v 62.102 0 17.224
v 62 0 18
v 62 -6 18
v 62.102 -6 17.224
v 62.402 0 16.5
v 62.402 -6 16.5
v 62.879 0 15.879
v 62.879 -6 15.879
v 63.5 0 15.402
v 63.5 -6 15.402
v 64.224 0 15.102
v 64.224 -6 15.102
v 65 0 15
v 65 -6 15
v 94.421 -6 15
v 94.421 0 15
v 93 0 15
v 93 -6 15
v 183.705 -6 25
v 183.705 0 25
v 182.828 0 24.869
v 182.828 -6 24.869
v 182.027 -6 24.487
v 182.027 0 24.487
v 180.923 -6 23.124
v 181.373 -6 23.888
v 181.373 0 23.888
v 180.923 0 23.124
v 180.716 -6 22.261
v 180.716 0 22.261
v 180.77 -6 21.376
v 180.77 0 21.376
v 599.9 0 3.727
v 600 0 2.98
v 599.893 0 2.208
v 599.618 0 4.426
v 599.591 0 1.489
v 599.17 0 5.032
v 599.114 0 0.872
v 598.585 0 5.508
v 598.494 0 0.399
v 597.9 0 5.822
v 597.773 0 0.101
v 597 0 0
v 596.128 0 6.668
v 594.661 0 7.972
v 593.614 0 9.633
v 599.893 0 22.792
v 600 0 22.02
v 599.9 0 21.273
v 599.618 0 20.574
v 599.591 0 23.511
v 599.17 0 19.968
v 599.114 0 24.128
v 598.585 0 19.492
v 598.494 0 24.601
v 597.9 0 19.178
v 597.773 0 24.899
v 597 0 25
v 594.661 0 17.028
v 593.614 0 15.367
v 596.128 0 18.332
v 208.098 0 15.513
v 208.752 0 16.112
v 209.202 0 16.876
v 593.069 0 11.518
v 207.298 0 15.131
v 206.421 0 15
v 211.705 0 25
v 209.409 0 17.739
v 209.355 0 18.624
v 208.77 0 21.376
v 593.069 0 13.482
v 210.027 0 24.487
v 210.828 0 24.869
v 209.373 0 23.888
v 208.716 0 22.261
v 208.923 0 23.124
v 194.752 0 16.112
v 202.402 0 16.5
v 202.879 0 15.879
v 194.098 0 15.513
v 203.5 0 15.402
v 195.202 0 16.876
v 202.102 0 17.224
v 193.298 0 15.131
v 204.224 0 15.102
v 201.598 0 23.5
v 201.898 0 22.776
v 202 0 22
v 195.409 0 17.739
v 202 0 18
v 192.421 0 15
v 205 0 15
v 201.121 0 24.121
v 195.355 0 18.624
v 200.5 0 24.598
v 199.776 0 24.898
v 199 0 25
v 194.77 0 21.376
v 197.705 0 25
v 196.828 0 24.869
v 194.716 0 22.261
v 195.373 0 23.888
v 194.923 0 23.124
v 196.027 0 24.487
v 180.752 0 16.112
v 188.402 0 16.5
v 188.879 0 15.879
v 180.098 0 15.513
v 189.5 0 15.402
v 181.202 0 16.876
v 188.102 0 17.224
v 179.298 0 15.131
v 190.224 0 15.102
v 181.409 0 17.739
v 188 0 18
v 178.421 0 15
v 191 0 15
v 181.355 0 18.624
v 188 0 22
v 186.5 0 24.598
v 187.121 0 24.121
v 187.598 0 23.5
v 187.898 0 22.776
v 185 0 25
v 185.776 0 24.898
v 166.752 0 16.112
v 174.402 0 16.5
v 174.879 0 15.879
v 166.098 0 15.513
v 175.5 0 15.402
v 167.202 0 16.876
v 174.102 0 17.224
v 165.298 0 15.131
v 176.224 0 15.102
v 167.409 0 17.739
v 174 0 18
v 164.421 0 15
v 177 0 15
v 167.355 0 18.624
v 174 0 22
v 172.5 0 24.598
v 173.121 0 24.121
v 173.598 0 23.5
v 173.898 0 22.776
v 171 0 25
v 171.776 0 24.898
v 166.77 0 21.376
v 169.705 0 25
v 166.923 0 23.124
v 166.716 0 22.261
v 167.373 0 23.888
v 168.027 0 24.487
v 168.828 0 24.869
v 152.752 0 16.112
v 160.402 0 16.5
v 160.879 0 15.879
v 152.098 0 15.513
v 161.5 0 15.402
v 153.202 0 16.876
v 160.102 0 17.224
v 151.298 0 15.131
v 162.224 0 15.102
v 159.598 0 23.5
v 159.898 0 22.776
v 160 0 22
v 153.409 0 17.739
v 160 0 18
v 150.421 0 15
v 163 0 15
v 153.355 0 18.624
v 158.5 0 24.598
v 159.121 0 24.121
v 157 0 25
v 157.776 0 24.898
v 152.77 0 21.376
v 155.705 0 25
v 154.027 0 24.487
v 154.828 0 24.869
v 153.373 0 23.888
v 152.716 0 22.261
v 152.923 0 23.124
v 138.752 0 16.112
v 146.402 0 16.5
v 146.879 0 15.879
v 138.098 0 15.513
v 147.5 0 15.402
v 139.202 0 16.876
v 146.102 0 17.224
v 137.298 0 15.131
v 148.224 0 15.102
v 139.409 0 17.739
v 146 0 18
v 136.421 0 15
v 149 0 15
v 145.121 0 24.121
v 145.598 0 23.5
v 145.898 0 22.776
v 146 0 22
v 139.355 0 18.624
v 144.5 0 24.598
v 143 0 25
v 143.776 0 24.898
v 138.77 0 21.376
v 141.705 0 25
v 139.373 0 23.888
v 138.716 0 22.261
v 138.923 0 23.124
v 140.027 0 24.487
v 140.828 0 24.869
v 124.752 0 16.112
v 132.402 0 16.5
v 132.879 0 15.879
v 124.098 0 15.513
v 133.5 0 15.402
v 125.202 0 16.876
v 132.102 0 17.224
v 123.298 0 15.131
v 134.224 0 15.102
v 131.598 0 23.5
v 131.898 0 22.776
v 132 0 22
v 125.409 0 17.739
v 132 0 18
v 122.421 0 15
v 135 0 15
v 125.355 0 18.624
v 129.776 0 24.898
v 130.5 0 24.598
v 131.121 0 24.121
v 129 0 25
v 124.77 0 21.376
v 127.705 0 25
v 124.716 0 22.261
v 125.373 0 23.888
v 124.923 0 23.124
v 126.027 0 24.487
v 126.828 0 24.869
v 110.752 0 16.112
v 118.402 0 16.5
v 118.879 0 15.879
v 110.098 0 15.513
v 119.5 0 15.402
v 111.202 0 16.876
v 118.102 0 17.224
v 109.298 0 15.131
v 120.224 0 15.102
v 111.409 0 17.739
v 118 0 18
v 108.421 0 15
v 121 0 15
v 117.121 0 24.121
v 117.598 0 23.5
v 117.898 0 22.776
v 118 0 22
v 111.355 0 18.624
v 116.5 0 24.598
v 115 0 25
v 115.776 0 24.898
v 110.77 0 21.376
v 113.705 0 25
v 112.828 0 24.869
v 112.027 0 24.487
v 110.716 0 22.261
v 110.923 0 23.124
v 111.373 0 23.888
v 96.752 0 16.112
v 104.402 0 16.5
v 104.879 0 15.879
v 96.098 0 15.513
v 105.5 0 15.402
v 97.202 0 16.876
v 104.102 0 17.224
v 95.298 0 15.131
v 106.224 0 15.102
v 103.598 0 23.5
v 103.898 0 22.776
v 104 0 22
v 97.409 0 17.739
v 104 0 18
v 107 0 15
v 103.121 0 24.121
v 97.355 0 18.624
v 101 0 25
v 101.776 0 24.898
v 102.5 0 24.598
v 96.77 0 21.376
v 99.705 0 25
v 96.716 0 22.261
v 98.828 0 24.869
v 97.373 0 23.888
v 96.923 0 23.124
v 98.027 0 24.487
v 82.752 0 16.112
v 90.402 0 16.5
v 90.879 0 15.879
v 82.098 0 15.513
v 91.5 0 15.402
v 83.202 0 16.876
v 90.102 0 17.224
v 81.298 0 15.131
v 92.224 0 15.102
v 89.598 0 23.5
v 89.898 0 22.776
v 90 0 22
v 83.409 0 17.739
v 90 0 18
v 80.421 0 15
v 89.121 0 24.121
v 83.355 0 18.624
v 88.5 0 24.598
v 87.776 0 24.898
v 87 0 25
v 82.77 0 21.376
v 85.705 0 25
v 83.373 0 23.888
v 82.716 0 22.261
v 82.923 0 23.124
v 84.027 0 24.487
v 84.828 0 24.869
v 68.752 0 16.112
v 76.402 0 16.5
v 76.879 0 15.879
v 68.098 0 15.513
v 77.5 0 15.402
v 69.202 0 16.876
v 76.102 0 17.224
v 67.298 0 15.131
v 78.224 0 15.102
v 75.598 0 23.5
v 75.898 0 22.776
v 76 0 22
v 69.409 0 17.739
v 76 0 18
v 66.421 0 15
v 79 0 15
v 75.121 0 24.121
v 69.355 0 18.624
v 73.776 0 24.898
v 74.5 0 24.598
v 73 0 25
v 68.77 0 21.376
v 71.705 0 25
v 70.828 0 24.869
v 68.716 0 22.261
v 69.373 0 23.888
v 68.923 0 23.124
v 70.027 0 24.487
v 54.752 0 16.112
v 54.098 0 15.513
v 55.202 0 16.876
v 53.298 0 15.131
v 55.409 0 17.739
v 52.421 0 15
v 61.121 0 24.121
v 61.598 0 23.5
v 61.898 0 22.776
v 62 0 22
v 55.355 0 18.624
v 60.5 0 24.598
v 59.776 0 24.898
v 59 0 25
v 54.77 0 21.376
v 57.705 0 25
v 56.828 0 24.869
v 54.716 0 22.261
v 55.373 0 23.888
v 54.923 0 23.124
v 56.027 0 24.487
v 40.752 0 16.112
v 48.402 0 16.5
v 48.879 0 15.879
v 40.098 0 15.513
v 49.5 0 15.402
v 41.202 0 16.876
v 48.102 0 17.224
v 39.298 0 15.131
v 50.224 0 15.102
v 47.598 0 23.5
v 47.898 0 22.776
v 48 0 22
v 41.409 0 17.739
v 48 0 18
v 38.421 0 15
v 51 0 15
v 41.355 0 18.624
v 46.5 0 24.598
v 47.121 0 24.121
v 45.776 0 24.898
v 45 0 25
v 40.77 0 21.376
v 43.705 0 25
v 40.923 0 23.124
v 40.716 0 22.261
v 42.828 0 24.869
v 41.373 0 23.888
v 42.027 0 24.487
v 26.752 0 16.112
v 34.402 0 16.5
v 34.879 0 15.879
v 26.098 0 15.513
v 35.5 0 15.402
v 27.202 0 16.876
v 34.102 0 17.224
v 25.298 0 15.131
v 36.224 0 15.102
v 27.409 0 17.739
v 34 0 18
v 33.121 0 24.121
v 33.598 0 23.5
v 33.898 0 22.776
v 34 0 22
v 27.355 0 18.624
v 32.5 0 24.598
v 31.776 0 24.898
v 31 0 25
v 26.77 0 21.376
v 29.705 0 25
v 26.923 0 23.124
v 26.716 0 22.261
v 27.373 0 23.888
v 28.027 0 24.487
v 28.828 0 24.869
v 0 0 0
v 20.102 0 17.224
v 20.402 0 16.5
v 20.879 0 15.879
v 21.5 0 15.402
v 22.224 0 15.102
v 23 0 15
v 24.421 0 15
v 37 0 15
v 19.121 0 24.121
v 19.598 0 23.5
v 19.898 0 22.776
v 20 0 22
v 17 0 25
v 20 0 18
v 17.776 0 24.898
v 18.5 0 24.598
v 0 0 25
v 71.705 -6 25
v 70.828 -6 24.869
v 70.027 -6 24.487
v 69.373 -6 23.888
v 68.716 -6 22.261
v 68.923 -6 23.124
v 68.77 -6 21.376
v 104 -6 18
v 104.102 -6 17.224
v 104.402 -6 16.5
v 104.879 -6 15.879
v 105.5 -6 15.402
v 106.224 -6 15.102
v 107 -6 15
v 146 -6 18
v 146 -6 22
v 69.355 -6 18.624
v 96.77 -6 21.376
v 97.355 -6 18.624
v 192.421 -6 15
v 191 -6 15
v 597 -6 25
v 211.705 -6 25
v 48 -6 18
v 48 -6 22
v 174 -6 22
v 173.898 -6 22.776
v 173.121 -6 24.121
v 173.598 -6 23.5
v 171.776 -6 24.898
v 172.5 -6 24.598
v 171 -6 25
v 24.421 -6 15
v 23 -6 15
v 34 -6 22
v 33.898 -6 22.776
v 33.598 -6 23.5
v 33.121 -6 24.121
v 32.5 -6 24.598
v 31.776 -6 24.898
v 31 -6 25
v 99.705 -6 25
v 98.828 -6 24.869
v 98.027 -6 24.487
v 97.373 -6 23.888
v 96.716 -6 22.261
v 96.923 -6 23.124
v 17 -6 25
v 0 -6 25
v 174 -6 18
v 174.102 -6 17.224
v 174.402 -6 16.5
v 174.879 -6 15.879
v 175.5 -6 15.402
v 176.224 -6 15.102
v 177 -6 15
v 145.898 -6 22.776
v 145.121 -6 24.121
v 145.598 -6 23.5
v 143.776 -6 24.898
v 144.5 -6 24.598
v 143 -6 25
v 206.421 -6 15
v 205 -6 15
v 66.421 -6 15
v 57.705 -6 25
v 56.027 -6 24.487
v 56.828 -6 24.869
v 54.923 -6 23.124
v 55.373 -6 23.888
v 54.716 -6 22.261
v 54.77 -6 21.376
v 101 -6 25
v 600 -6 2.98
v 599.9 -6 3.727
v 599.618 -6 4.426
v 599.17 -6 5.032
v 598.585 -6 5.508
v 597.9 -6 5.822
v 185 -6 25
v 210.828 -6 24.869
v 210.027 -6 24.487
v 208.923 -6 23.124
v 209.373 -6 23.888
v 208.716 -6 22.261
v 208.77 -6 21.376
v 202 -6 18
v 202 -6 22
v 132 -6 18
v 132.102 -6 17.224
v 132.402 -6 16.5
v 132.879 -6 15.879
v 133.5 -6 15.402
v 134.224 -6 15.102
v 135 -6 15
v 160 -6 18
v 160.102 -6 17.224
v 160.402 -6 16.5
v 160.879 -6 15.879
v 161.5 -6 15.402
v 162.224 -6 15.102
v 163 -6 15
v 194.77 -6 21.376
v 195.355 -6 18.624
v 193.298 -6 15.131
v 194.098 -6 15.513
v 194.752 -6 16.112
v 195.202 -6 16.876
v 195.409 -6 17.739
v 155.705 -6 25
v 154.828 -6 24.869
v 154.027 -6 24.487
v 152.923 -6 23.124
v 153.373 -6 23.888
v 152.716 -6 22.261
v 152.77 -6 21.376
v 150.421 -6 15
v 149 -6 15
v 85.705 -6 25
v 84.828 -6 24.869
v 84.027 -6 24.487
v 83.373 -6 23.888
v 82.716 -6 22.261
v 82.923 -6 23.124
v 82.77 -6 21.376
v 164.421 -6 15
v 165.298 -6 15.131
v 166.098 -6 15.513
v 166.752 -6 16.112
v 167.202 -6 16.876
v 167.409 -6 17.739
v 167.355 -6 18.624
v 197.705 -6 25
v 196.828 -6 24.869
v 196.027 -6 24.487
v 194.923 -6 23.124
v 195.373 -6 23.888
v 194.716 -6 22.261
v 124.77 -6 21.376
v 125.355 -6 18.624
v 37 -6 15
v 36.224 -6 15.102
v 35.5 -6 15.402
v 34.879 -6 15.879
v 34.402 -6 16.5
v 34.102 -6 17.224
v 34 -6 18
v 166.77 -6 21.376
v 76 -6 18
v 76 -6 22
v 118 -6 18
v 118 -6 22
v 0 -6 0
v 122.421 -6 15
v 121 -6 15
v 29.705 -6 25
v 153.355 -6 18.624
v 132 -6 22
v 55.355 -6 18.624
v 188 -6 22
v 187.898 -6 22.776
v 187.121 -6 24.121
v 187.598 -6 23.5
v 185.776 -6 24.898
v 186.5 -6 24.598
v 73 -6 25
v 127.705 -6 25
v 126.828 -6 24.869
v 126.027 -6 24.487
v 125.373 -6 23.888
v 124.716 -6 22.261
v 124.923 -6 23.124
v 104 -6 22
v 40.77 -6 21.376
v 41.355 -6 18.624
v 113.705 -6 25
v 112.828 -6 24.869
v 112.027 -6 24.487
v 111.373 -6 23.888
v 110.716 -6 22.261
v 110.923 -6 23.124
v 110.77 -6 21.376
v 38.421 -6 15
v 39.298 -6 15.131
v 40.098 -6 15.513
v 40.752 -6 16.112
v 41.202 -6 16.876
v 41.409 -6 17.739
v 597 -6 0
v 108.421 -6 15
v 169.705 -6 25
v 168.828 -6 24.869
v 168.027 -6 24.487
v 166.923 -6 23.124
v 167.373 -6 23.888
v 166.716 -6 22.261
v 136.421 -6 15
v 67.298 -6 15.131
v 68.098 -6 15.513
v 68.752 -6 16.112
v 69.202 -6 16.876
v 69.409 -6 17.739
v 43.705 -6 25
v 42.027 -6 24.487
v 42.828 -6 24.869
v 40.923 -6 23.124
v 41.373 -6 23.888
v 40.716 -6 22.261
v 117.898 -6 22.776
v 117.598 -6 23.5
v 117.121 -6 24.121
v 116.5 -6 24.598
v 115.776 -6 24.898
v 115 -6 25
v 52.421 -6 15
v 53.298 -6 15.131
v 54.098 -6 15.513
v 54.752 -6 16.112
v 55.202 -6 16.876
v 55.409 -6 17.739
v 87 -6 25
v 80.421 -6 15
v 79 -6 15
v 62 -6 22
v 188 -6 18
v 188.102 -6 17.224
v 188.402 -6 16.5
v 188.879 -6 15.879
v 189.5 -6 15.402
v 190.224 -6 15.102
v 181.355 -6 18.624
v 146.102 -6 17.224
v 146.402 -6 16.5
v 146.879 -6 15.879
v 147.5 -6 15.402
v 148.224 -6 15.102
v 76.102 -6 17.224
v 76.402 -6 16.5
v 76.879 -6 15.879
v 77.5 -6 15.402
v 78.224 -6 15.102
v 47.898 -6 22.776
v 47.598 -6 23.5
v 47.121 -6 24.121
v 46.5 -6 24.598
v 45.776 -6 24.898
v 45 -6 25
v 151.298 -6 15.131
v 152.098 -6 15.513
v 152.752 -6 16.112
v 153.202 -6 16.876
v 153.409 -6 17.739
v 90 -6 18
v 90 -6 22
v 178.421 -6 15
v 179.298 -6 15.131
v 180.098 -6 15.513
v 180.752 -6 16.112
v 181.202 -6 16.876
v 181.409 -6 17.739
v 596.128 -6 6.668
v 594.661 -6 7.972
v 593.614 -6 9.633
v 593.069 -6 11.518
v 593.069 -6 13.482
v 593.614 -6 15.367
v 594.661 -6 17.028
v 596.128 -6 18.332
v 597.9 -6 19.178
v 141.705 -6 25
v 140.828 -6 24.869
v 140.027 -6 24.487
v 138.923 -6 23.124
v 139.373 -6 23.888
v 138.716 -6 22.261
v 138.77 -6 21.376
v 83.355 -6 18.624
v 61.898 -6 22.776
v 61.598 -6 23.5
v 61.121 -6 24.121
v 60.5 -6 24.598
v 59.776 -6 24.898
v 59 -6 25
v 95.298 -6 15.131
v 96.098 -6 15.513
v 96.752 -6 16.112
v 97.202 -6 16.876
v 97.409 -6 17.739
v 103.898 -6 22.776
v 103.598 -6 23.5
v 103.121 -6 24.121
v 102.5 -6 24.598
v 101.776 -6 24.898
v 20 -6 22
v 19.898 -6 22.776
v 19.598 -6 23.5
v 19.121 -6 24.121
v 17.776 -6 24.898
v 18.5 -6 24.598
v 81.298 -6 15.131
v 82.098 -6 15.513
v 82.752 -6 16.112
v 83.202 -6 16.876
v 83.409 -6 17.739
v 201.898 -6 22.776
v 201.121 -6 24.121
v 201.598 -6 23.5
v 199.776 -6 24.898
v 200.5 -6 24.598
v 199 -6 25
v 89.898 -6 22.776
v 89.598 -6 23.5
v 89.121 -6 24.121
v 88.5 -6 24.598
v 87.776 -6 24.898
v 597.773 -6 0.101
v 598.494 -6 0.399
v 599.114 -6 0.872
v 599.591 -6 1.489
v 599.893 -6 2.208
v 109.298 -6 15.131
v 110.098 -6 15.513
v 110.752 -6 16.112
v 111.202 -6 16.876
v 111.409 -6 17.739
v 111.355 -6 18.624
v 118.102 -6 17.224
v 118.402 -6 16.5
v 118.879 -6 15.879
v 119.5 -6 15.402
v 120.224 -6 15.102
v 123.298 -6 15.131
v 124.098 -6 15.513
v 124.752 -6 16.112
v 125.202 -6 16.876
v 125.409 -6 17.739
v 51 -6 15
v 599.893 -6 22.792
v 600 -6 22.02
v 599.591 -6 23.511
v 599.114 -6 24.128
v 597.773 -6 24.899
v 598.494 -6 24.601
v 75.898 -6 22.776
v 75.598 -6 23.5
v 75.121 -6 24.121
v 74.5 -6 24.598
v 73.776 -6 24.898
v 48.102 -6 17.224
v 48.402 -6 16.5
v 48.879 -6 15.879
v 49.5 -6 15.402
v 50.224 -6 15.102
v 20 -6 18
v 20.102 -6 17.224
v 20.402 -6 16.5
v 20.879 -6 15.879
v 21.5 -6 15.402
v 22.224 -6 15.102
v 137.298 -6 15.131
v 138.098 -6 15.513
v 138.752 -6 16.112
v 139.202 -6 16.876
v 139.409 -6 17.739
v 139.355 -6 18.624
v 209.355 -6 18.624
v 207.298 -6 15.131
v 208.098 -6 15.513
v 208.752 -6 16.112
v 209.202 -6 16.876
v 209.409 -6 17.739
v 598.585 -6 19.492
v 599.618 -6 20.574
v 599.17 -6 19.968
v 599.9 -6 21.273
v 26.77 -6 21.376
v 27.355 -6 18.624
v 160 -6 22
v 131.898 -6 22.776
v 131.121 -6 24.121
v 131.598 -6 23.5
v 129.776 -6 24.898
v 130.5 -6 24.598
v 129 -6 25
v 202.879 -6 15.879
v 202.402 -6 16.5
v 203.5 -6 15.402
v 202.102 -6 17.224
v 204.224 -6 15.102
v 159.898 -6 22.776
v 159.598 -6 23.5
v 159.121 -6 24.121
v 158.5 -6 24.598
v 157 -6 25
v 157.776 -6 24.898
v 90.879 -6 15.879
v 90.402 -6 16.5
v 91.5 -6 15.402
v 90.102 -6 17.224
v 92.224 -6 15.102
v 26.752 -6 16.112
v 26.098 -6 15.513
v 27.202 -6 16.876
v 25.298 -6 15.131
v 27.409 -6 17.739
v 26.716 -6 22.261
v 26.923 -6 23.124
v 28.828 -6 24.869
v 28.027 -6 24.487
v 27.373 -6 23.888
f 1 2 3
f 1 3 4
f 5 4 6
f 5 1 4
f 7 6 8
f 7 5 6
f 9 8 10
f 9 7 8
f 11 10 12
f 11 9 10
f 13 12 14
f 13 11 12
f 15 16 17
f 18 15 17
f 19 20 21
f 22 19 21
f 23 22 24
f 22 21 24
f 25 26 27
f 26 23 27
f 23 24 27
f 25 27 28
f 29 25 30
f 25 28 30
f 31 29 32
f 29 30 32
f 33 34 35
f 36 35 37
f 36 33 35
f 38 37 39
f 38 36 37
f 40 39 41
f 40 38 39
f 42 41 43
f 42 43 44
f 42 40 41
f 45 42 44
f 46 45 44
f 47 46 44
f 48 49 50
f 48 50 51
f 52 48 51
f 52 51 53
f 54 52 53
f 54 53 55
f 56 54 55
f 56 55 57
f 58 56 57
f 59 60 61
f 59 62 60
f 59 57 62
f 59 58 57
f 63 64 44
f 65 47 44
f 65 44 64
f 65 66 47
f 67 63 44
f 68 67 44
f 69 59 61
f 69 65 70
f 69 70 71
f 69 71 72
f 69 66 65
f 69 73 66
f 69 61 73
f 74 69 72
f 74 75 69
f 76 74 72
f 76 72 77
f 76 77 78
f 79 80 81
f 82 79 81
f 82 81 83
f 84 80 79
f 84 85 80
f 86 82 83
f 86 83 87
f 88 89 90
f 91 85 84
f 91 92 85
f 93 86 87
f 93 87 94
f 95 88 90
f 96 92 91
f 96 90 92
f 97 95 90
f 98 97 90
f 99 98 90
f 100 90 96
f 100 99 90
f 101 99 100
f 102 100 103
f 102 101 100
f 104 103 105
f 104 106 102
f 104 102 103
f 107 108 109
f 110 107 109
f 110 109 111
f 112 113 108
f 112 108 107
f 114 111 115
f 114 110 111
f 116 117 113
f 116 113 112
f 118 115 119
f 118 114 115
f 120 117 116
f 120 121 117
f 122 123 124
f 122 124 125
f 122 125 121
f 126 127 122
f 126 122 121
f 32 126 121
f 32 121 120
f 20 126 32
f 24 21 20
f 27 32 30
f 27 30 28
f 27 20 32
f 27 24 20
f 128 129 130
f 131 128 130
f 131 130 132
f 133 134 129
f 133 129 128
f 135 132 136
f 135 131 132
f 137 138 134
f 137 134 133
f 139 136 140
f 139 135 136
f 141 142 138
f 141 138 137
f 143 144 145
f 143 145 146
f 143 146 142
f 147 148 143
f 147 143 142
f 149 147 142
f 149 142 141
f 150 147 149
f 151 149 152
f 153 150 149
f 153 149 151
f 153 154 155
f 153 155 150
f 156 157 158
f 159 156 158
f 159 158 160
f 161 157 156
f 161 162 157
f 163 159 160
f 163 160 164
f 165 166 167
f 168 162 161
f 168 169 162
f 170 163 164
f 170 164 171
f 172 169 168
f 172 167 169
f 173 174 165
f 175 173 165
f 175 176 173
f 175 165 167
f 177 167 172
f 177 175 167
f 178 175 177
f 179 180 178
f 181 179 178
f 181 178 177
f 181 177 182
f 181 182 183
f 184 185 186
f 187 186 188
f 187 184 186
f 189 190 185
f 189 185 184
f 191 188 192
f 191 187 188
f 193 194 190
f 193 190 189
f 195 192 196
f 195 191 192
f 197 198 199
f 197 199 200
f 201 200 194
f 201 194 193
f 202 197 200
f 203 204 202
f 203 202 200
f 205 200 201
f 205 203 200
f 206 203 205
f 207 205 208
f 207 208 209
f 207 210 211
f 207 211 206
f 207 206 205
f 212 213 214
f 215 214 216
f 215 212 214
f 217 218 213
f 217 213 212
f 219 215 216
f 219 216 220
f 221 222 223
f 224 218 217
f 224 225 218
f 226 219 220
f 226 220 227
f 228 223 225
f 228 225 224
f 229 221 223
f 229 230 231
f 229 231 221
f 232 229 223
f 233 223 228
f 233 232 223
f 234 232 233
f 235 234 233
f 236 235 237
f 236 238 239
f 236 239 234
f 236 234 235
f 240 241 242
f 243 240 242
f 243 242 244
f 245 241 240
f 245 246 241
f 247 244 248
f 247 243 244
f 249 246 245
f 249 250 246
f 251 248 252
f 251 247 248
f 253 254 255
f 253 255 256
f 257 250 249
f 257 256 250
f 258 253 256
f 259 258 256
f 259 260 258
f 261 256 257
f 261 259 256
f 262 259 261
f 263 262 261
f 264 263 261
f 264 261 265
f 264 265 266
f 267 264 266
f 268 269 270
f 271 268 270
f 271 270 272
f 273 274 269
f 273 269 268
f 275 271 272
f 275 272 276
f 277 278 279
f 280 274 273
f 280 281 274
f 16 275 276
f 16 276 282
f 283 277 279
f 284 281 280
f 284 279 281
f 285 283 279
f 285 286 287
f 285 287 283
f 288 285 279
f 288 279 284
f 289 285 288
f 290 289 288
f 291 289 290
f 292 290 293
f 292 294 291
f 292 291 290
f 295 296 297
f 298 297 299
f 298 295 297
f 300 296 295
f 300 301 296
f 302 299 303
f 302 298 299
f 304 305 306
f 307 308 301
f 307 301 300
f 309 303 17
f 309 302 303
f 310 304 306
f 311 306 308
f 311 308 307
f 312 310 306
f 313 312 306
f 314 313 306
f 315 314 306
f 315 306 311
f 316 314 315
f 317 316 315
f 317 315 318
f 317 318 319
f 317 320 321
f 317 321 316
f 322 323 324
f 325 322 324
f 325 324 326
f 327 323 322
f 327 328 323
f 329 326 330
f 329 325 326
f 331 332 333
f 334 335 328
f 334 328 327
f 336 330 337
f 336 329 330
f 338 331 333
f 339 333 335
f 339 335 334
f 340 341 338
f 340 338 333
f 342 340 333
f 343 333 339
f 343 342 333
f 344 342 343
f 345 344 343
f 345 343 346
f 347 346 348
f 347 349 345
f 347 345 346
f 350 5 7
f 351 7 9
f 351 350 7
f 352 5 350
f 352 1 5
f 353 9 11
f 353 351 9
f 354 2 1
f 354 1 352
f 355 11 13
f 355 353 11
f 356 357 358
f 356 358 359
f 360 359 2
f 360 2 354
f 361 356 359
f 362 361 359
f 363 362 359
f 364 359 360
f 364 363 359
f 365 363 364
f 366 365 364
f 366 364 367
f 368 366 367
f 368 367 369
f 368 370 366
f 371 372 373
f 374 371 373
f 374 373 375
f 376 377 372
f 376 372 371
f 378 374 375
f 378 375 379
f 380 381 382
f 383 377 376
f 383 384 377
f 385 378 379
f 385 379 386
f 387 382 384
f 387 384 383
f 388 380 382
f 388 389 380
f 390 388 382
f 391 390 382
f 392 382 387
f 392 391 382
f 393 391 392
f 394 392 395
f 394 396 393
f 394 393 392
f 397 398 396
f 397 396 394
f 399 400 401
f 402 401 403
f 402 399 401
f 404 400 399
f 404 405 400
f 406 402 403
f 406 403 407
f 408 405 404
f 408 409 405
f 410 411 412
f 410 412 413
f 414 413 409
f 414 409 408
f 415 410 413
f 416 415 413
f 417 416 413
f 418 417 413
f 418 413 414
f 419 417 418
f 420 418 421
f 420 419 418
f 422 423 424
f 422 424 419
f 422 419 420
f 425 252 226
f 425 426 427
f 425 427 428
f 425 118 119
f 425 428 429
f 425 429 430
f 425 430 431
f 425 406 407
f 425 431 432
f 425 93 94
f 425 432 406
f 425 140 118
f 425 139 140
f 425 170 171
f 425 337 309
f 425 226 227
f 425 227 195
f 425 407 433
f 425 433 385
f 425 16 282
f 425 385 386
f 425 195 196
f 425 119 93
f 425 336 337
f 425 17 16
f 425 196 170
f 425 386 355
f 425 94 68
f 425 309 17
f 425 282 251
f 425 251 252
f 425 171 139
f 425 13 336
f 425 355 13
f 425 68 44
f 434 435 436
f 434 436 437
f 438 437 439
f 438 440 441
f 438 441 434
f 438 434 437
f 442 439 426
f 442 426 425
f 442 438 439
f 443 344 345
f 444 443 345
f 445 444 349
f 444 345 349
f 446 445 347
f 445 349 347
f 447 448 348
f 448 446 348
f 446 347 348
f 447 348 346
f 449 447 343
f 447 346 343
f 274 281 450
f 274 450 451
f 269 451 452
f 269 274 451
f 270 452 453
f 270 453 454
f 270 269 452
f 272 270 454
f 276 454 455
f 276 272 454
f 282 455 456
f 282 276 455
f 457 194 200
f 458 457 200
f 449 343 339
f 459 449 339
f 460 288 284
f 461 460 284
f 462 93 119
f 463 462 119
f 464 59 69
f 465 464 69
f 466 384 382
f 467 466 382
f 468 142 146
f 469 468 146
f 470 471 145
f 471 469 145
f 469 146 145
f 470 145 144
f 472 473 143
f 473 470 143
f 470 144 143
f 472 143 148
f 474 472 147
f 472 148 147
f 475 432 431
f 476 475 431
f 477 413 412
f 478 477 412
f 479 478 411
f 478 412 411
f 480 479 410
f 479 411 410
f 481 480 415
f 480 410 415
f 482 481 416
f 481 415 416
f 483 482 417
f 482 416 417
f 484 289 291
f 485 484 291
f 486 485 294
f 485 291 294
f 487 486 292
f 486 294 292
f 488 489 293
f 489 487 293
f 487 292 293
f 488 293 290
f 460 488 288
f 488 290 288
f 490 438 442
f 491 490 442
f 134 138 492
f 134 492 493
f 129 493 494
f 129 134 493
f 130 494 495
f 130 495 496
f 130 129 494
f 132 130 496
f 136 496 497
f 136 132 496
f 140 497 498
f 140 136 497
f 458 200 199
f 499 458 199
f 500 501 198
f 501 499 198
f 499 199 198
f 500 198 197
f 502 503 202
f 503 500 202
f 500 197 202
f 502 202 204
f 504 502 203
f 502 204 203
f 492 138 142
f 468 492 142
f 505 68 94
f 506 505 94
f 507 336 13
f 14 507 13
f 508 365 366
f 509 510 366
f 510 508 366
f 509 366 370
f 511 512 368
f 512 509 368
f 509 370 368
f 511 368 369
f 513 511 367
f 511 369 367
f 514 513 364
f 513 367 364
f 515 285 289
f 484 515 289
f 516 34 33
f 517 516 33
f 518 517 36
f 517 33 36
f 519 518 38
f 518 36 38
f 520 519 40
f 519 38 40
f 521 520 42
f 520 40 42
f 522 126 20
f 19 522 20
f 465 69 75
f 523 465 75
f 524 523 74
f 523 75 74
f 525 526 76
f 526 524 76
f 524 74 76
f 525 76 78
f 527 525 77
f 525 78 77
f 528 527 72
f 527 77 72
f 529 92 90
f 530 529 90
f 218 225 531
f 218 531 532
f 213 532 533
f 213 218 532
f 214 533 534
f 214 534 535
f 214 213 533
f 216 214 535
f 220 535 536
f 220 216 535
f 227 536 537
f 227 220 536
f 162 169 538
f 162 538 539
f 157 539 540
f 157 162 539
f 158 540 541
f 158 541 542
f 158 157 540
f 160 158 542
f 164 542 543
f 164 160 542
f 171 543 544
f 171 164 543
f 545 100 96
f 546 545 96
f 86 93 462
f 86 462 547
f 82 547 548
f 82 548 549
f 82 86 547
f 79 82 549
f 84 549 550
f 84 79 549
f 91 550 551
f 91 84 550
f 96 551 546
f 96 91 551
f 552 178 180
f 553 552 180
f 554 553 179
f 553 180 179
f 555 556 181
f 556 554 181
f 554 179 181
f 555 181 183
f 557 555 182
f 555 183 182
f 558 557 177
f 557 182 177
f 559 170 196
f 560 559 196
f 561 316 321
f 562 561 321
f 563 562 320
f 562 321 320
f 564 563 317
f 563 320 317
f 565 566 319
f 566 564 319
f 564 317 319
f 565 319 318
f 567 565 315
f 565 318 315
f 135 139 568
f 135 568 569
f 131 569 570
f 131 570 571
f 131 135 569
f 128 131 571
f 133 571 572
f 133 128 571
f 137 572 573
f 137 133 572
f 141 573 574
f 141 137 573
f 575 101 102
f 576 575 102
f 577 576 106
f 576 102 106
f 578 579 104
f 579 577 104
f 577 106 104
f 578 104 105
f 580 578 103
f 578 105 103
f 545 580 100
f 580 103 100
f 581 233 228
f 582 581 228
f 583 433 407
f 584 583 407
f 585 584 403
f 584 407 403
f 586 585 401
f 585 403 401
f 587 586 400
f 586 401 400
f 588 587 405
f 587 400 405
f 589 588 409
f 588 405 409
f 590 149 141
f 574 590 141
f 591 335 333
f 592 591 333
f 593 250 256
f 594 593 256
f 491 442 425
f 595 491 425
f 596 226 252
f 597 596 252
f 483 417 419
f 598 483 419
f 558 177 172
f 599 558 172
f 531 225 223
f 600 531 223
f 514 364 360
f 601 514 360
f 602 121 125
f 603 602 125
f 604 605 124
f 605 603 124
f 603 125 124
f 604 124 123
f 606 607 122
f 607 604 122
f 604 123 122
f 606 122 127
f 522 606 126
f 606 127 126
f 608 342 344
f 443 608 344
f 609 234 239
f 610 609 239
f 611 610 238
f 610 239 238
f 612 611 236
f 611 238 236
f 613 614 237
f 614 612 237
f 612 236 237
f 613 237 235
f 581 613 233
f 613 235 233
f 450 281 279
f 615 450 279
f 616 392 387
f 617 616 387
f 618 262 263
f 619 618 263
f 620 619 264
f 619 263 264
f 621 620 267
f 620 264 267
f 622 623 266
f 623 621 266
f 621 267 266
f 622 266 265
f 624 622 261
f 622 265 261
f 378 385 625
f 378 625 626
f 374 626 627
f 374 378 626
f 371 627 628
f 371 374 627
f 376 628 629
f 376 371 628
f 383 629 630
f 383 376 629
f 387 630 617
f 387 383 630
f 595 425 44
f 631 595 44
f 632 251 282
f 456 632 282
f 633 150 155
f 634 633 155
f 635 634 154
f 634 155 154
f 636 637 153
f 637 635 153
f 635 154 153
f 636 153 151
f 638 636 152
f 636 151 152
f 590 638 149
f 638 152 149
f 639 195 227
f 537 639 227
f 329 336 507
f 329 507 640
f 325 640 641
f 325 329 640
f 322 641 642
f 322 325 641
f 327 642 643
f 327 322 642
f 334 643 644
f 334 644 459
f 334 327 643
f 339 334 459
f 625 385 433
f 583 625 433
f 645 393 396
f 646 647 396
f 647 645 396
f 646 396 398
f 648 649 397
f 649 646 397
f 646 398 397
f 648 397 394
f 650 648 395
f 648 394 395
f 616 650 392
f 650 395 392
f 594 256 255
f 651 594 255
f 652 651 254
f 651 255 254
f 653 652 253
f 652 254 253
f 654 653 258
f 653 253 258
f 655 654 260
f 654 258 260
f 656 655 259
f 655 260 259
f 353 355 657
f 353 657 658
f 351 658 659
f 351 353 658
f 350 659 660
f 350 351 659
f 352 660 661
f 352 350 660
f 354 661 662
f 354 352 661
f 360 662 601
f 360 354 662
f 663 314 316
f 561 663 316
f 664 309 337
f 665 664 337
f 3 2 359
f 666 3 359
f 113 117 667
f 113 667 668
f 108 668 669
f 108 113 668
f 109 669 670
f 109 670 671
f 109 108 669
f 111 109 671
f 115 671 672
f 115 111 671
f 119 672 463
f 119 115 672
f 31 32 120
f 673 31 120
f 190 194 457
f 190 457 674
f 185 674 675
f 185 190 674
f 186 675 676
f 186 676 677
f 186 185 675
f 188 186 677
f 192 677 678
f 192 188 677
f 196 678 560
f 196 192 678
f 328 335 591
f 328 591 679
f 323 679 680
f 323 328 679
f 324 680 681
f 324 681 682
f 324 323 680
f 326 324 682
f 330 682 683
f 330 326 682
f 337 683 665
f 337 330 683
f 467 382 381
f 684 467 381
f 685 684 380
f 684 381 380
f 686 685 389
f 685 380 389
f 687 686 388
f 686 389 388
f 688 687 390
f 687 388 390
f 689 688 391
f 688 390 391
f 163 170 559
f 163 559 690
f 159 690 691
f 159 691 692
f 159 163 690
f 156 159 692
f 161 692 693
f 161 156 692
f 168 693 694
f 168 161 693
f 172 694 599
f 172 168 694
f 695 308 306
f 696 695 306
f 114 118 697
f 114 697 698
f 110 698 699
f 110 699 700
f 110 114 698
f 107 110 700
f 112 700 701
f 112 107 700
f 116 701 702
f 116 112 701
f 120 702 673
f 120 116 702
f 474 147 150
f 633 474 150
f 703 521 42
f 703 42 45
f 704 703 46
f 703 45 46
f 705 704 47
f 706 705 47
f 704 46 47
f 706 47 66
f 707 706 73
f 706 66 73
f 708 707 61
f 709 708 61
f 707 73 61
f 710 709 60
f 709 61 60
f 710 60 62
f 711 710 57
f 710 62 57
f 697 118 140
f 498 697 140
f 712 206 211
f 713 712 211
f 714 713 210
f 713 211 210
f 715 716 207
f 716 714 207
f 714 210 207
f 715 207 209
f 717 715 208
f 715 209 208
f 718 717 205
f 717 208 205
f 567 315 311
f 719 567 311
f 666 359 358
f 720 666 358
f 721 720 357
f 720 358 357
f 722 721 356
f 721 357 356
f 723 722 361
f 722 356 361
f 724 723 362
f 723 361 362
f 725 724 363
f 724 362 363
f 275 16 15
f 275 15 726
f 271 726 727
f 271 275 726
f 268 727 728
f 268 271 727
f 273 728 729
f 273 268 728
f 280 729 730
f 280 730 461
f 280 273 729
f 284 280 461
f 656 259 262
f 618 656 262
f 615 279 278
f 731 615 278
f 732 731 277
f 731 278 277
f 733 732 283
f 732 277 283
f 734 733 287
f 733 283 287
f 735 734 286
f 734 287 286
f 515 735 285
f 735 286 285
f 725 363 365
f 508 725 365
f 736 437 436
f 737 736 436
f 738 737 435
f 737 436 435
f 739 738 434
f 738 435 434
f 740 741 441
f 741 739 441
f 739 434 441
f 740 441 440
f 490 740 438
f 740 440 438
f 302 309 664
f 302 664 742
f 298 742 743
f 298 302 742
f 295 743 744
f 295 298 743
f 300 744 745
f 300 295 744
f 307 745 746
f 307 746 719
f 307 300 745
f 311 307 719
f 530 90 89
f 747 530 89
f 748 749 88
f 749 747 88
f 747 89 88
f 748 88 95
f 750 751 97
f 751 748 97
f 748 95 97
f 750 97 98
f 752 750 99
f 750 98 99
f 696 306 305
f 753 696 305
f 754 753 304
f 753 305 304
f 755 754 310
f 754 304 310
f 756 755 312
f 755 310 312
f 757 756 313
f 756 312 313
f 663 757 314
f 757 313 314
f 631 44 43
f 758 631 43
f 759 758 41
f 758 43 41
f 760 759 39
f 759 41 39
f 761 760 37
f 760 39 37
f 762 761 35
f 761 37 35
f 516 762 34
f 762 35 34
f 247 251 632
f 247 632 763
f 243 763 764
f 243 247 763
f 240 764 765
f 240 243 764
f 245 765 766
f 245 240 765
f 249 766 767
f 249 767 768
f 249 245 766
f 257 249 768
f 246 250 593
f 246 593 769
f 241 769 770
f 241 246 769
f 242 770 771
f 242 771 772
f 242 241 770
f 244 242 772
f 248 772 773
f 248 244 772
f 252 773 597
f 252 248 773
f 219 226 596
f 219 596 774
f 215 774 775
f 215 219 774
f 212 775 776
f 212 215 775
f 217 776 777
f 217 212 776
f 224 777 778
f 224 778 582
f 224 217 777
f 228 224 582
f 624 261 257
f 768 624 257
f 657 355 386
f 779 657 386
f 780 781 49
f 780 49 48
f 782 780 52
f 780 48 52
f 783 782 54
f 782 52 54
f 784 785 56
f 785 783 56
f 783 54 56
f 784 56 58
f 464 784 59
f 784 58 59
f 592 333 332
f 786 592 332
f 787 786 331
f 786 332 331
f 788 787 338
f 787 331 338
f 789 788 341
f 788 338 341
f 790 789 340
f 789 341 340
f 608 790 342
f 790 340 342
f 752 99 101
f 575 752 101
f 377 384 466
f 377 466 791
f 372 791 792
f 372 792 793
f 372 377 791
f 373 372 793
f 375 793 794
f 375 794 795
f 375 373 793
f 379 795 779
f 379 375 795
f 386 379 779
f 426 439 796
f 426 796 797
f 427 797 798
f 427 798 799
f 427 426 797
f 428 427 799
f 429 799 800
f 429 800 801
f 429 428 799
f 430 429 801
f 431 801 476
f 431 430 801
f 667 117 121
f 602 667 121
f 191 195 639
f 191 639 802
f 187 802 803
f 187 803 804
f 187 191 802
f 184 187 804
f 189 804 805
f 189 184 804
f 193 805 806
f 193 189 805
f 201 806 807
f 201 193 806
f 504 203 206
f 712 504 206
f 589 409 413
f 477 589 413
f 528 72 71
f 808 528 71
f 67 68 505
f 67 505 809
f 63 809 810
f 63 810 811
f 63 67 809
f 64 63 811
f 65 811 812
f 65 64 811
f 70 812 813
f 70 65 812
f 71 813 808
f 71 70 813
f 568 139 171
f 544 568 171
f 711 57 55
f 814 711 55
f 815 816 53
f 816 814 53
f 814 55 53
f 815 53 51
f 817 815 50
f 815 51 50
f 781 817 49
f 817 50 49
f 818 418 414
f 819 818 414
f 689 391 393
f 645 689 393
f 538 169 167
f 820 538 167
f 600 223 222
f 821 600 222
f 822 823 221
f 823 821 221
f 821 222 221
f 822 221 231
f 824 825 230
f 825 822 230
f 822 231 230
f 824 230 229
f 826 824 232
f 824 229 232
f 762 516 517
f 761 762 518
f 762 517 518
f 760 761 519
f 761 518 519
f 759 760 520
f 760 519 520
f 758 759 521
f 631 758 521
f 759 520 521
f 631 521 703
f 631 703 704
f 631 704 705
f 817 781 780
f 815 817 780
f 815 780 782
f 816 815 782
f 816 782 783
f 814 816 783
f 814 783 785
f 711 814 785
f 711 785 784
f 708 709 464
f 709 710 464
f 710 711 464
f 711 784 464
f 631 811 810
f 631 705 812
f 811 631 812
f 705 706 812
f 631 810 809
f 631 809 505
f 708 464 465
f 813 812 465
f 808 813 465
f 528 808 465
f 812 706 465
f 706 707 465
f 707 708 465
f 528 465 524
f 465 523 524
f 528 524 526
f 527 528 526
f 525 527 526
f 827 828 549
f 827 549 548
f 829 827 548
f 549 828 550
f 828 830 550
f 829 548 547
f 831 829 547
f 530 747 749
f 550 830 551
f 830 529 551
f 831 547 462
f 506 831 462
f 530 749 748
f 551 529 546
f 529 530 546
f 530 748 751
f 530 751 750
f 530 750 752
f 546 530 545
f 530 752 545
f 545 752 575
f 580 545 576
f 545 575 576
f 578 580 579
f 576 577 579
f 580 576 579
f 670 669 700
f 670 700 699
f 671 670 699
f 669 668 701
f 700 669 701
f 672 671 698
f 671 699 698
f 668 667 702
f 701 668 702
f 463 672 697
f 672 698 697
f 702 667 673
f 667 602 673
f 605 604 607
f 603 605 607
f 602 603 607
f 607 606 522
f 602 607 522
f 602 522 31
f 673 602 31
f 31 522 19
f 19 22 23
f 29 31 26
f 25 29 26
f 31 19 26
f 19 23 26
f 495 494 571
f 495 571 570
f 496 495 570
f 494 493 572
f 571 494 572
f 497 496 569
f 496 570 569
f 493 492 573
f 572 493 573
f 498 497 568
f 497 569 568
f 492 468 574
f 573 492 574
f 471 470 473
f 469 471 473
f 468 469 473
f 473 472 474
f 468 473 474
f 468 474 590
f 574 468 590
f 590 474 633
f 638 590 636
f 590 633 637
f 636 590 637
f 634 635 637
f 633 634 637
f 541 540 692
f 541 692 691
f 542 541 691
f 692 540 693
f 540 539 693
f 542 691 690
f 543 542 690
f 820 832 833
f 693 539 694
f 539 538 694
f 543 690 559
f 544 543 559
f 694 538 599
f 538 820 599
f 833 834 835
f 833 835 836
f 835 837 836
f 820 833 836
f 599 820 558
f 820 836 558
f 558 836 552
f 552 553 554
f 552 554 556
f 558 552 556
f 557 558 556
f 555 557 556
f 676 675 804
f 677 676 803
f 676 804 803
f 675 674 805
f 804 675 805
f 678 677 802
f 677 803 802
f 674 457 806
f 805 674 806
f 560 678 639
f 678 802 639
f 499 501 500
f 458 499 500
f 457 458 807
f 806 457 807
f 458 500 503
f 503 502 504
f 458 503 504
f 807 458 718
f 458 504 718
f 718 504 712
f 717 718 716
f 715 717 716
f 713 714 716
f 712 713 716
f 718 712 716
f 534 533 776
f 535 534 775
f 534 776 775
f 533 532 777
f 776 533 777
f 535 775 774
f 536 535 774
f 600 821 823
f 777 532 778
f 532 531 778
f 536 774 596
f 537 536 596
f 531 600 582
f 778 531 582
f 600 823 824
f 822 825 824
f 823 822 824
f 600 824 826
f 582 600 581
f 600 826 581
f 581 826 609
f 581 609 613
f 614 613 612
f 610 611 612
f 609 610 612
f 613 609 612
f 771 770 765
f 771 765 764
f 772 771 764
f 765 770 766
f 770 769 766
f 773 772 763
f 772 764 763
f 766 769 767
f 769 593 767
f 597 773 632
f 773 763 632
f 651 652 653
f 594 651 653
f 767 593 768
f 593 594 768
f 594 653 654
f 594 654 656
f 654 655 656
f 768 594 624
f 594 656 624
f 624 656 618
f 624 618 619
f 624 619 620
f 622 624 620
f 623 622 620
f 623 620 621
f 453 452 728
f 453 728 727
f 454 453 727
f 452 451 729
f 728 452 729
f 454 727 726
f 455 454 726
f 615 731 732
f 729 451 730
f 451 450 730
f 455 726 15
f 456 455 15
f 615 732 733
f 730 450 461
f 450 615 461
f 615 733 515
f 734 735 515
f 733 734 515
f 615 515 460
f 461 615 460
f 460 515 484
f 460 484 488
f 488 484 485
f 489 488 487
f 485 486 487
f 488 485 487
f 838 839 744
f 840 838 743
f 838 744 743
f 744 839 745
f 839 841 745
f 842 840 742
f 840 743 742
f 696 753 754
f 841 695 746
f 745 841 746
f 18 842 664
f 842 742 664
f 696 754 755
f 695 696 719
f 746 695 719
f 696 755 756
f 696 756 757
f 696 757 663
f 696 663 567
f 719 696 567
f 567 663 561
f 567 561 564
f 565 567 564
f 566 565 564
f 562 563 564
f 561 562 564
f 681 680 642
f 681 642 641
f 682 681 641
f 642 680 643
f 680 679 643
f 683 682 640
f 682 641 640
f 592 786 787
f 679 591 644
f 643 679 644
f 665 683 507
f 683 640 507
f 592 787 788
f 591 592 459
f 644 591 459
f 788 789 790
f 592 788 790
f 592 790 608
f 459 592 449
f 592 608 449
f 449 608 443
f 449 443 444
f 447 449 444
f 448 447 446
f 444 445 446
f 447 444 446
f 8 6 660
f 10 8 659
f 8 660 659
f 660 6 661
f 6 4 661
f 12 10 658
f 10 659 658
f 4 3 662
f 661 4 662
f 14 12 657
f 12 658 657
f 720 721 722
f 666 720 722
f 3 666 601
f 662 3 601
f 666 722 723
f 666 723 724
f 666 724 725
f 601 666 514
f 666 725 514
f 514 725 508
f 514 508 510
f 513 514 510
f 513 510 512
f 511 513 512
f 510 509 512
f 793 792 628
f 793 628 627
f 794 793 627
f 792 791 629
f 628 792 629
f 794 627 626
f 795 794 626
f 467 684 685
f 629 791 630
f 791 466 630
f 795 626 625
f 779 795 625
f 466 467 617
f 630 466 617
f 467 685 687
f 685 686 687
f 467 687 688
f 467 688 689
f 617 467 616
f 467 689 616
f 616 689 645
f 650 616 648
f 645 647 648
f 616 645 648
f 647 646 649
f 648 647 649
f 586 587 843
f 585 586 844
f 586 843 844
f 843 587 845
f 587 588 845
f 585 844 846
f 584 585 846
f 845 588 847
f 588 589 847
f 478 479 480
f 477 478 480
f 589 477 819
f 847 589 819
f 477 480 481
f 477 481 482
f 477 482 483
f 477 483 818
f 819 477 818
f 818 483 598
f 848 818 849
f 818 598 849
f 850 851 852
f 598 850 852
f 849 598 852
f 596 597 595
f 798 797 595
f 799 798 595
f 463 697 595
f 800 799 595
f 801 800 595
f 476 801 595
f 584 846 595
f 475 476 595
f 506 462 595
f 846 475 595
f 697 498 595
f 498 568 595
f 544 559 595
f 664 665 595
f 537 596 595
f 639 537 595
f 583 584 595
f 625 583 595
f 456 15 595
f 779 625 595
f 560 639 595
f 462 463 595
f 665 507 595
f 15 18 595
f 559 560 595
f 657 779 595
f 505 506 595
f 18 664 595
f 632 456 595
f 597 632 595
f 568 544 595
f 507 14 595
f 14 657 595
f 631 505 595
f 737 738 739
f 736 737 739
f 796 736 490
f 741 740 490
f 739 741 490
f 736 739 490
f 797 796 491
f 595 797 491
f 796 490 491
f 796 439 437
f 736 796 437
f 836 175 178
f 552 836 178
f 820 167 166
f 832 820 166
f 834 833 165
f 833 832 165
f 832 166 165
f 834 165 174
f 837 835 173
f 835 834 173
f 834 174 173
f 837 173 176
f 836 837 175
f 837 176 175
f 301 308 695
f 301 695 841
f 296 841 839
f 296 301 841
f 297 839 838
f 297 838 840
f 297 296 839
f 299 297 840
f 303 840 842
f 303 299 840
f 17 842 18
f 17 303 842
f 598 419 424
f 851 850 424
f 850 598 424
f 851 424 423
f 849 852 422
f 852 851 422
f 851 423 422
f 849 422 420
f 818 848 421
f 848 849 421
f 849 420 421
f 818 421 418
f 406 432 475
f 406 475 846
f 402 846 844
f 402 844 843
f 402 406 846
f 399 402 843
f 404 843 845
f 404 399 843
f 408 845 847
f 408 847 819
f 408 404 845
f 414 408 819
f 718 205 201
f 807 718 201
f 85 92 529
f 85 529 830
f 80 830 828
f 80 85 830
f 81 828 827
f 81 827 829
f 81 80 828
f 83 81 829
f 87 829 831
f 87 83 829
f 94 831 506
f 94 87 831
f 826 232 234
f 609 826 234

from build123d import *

# Parameters (mm, degrees)
F1_DEPTH    = 6
F2_T1_DEPTH = 6
F2_T3_DEPTH = 24.523457348
F2_T5_DEPTH = 21
F2_T7_DEPTH = 18.6969600709


# Not quite as in the source:
# - a fillet or chamfer that OpenCascade refuses, or shapes differently, is made with other operations: its cross-section is extruded or revolved along the edge and cut away or added


with BuildPart() as f1:
    # F0 (on Front) → F1 (new body)
    with BuildSketch(Plane.XZ):
        with BuildLine():
            Line((0, 25), (0, 0))
            Line((0, 0), (600, 0))
            Line((600, 0), (600, 5.5))
            ThreePointArc((600, 5.5), (593, 12.5), (600, 19.5))
            Line((600, 19.5), (600, 25))
            Line((600, 25), (208, 25))
            Line((208, 25), (210.1255656167, 15))
            Line((210.1255656167, 15), (208, 15))
            Line((208, 15), (202, 15))
            Line((202, 15), (202, 25))
            Line((202, 25), (194, 25))
            Line((194, 25), (196.1255656167, 15))
            Line((196.1255656167, 15), (194, 15))
            Line((194, 15), (188, 15))
            Line((188, 15), (188, 25))
            Line((188, 25), (180, 25))
            Line((180, 25), (182.1255656167, 15))
            Line((182.1255656167, 15), (180, 15))
            Line((180, 15), (174, 15))
            Line((174, 15), (174, 25))
            Line((174, 25), (166, 25))
            Line((166, 25), (168.1255656167, 15))
            Line((168.1255656167, 15), (166, 15))
            Line((166, 15), (160, 15))
            Line((160, 15), (160, 25))
            Line((160, 25), (152, 25))
            Line((152, 25), (154.1255656167, 15))
            Line((154.1255656167, 15), (152, 15))
            Line((152, 15), (146, 15))
            Line((146, 15), (146, 25))
            Line((146, 25), (138, 25))
            Line((138, 25), (140.1255656167, 15))
            Line((140.1255656167, 15), (138, 15))
            Line((138, 15), (132, 15))
            Line((132, 15), (132, 25))
            Line((132, 25), (124, 25))
            Line((124, 25), (126.1255656167, 15))
            Line((126.1255656167, 15), (124, 15))
            Line((124, 15), (118, 15))
            Line((118, 15), (118, 25))
            Line((118, 25), (110, 25))
            Line((110, 25), (112.1255656167, 15))
            Line((112.1255656167, 15), (110, 15))
            Line((110, 15), (104, 15))
            Line((104, 15), (104, 25))
            Line((104, 25), (96, 25))
            Line((96, 25), (98.1255656167, 15))
            Line((98.1255656167, 15), (96, 15))
            Line((96, 15), (90, 15))
            Line((90, 15), (90, 25))
            Line((90, 25), (82, 25))
            Line((82, 25), (84.1255656167, 15))
            Line((84.1255656167, 15), (82, 15))
            Line((82, 15), (76, 15))
            Line((76, 15), (76, 25))
            Line((76, 25), (68, 25))
            Line((68, 25), (70.1255656167, 15))
            Line((70.1255656167, 15), (68, 15))
            Line((68, 15), (62, 15))
            Line((62, 15), (62, 25))
            Line((62, 25), (54, 25))
            Line((54, 25), (56.1255656167, 15))
            Line((56.1255656167, 15), (54, 15))
            Line((54, 15), (48, 15))
            Line((48, 15), (48, 25))
            Line((48, 25), (40, 25))
            Line((40, 25), (42.1255656167, 15))
            Line((42.1255656167, 15), (40, 15))
            Line((40, 15), (34, 15))
            Line((34, 15), (34, 25))
            Line((34, 25), (26, 25))
            Line((26, 25), (28.1255656167, 15))
            Line((28.1255656167, 15), (26, 15))
            Line((26, 15), (20, 15))
            Line((20, 15), (20, 25))
            Line((20, 25), (0, 25))
        make_face()
    extrude(amount=F1_DEPTH)

    # F2: fillet of radius 3 on 60 edges, made by hand

    # F2_s2 → F2_t1 (join)
    with BuildSketch(Plane.XZ):
        with BuildLine():
            ThreePointArc((20, 18), (20.8786796564, 15.8786796564), (23, 15))
            Line((23, 15), (20, 15))
            Line((20, 15), (20, 18))
        make_face()
        with BuildLine():
            ThreePointArc((37, 15), (34.8786796564, 15.8786796564), (34, 18))
            Line((34, 18), (34, 15))
            Line((34, 15), (37, 15))
        make_face()
        with BuildLine():
            ThreePointArc((48, 18), (48.8786796564, 15.8786796564), (51, 15))
            Line((51, 15), (48, 15))
            Line((48, 15), (48, 18))
        make_face()
        with BuildLine():
            ThreePointArc((62, 18), (62.8786796564, 15.8786796564), (65, 15))
            Line((65, 15), (62, 15))
            Line((62, 15), (62, 18))
        make_face()
        with BuildLine():
            ThreePointArc((76, 18), (76.8786796564, 15.8786796564), (79, 15))
            Line((79, 15), (76, 15))
            Line((76, 15), (76, 18))
        make_face()
        with BuildLine():
            ThreePointArc((90, 18), (90.8786796564, 15.8786796564), (93, 15))
            Line((93, 15), (90, 15))
            Line((90, 15), (90, 18))
        make_face()
        with BuildLine():
            ThreePointArc((104, 18), (104.8786796564, 15.8786796564), (107, 15))
            Line((107, 15), (104, 15))
            Line((104, 15), (104, 18))
        make_face()
        with BuildLine():
            ThreePointArc((118, 18), (118.8786796564, 15.8786796564), (121, 15))
            Line((121, 15), (118, 15))
            Line((118, 15), (118, 18))
        make_face()
        with BuildLine():
            ThreePointArc((132, 18), (132.8786796564, 15.8786796564), (135, 15))
            Line((135, 15), (132, 15))
            Line((132, 15), (132, 18))
        make_face()
        with BuildLine():
            ThreePointArc((146, 18), (146.8786796564, 15.8786796564), (149, 15))
            Line((149, 15), (146, 15))
            Line((146, 15), (146, 18))
        make_face()
        with BuildLine():
            ThreePointArc((160, 18), (160.8786796564, 15.8786796564), (163, 15))
            Line((163, 15), (160, 15))
            Line((160, 15), (160, 18))
        make_face()
        with BuildLine():
            ThreePointArc((174, 18), (174.8786796564, 15.8786796564), (177, 15))
            Line((177, 15), (174, 15))
            Line((174, 15), (174, 18))
        make_face()
        with BuildLine():
            ThreePointArc((188, 18), (188.8786796564, 15.8786796564), (191, 15))
            Line((191, 15), (188, 15))
            Line((188, 15), (188, 18))
        make_face()
        with BuildLine():
            ThreePointArc((202, 18), (202.8786796564, 15.8786796564), (205, 15))
            Line((205, 15), (202, 15))
            Line((202, 15), (202, 18))
        make_face()
        with BuildLine():
            ThreePointArc((24.4208741471, 15), (26.7523120315, 16.1120388269), (27.3553169493, 18.6237350725))
            Line((27.3553169493, 18.6237350725), (28.1255656167, 15))
            Line((28.1255656167, 15), (24.4208741471, 15))
        make_face()
        with BuildLine():
            ThreePointArc((38.4208741471, 15), (40.7523120315, 16.1120388269), (41.3553169493, 18.6237350725))
            Line((41.3553169493, 18.6237350725), (42.1255656167, 15))
            Line((42.1255656167, 15), (38.4208741471, 15))
        make_face()
        with BuildLine():
            ThreePointArc((52.4208741471, 15), (54.7523120315, 16.1120388269), (55.3553169493, 18.6237350725))
            Line((55.3553169493, 18.6237350725), (56.1255656167, 15))
            Line((56.1255656167, 15), (52.4208741471, 15))
        make_face()
        with BuildLine():
            ThreePointArc((66.4208741471, 15), (68.7523120315, 16.1120388269), (69.3553169493, 18.6237350725))
            Line((69.3553169493, 18.6237350725), (70.1255656167, 15))
            Line((70.1255656167, 15), (66.4208741471, 15))
        make_face()
        with BuildLine():
            ThreePointArc((80.4208741471, 15), (82.7523120315, 16.1120388269), (83.3553169493, 18.6237350725))
            Line((83.3553169493, 18.6237350725), (84.1255656167, 15))
            Line((84.1255656167, 15), (80.4208741471, 15))
        make_face()
        with BuildLine():
            ThreePointArc((94.4208741471, 15), (96.7523120315, 16.1120388269), (97.3553169493, 18.6237350725))
            Line((97.3553169493, 18.6237350725), (98.1255656167, 15))
            Line((98.1255656167, 15), (94.4208741471, 15))
        make_face()
        with BuildLine():
            ThreePointArc((108.4208741471, 15), (110.7523120315, 16.1120388269), (111.3553169493, 18.6237350725))
            Line((111.3553169493, 18.6237350725), (112.1255656167, 15))
            Line((112.1255656167, 15), (108.4208741471, 15))
        make_face()
        with BuildLine():
            ThreePointArc((122.4208741471, 15), (124.7523120315, 16.1120388269), (125.3553169493, 18.6237350725))
            Line((125.3553169493, 18.6237350725), (126.1255656167, 15))
            Line((126.1255656167, 15), (122.4208741471, 15))
        make_face()
        with BuildLine():
            ThreePointArc((136.4208741471, 15), (138.7523120315, 16.1120388269), (139.3553169493, 18.6237350725))
            Line((139.3553169493, 18.6237350725), (140.1255656167, 15))
            Line((140.1255656167, 15), (136.4208741471, 15))
        make_face()
        with BuildLine():
            ThreePointArc((150.4208741471, 15), (152.7523120315, 16.1120388269), (153.3553169493, 18.6237350725))
            Line((153.3553169493, 18.6237350725), (154.1255656167, 15))
            Line((154.1255656167, 15), (150.4208741471, 15))
        make_face()
        with BuildLine():
            ThreePointArc((164.4208741471, 15), (166.7523120315, 16.1120388269), (167.3553169493, 18.6237350725))
            Line((167.3553169493, 18.6237350725), (168.1255656167, 15))
            Line((168.1255656167, 15), (164.4208741471, 15))
        make_face()
        with BuildLine():
            ThreePointArc((178.4208741471, 15), (180.7523120315, 16.1120388269), (181.3553169493, 18.6237350725))
            Line((181.3553169493, 18.6237350725), (182.1255656167, 15))
            Line((182.1255656167, 15), (178.4208741471, 15))
        make_face()
        with BuildLine():
            ThreePointArc((192.4208741471, 15), (194.7523120315, 16.1120388269), (195.3553169493, 18.6237350725))
            Line((195.3553169493, 18.6237350725), (196.1255656167, 15))
            Line((196.1255656167, 15), (192.4208741471, 15))
        make_face()
        with BuildLine():
            ThreePointArc((206.4208741471, 15), (208.7523120315, 16.1120388269), (209.3553169493, 18.6237350725))
            Line((209.3553169493, 18.6237350725), (210.1255656167, 15))
            Line((210.1255656167, 15), (206.4208741471, 15))
        make_face()
    extrude(amount=F2_T1_DEPTH)

    # F2_s4 → F2_t3 (cut)
    with BuildSketch(Plane.XZ.offset(-9.261728674)):
        with BuildLine():
            ThreePointArc((29.7046914696, 25), (27.3732535852, 23.8879611731), (26.7702486674, 21.3762649275))
            Line((26.7702486674, 21.3762649275), (26, 25))
            Line((26, 25), (29.7046914696, 25))
        make_face()
        with BuildLine():
            ThreePointArc((43.7046914696, 25), (41.3732535852, 23.8879611731), (40.7702486674, 21.3762649275))
            Line((40.7702486674, 21.3762649275), (40, 25))
            Line((40, 25), (43.7046914696, 25))
        make_face()
        with BuildLine():
            ThreePointArc((57.7046914696, 25), (55.3732535852, 23.8879611731), (54.7702486674, 21.3762649275))
            Line((54.7702486674, 21.3762649275), (54, 25))
            Line((54, 25), (57.7046914696, 25))
        make_face()
        with BuildLine():
            ThreePointArc((71.7046914696, 25), (69.3732535852, 23.8879611731), (68.7702486674, 21.3762649275))
            Line((68.7702486674, 21.3762649275), (68, 25))
            Line((68, 25), (71.7046914696, 25))
        make_face()
        with BuildLine():
            ThreePointArc((85.7046914696, 25), (83.3732535852, 23.8879611731), (82.7702486674, 21.3762649275))
            Line((82.7702486674, 21.3762649275), (82, 25))
            Line((82, 25), (85.7046914696, 25))
        make_face()
        with BuildLine():
            ThreePointArc((99.7046914696, 25), (97.3732535852, 23.8879611731), (96.7702486674, 21.3762649275))
            Line((96.7702486674, 21.3762649275), (96, 25))
            Line((96, 25), (99.7046914696, 25))
        make_face()
        with BuildLine():
            ThreePointArc((113.7046914696, 25), (111.3732535852, 23.8879611731), (110.7702486674, 21.3762649275))
            Line((110.7702486674, 21.3762649275), (110, 25))
            Line((110, 25), (113.7046914696, 25))
        make_face()
        with BuildLine():
            ThreePointArc((127.7046914696, 25), (125.3732535852, 23.8879611731), (124.7702486674, 21.3762649275))
            Line((124.7702486674, 21.3762649275), (124, 25))
            Line((124, 25), (127.7046914696, 25))
        make_face()
        with BuildLine():
            ThreePointArc((141.7046914696, 25), (139.3732535852, 23.8879611731), (138.7702486674, 21.3762649275))
            Line((138.7702486674, 21.3762649275), (138, 25))
            Line((138, 25), (141.7046914696, 25))
        make_face()
        with BuildLine():
            ThreePointArc((155.7046914696, 25), (153.3732535852, 23.8879611731), (152.7702486674, 21.3762649275))
            Line((152.7702486674, 21.3762649275), (152, 25))
            Line((152, 25), (155.7046914696, 25))
        make_face()
        with BuildLine():
            ThreePointArc((169.7046914696, 25), (167.3732535852, 23.8879611731), (166.7702486674, 21.3762649275))
            Line((166.7702486674, 21.3762649275), (166, 25))
            Line((166, 25), (169.7046914696, 25))
        make_face()
        with BuildLine():
            ThreePointArc((183.7046914696, 25), (181.3732535852, 23.8879611731), (180.7702486674, 21.3762649275))
            Line((180.7702486674, 21.3762649275), (180, 25))
            Line((180, 25), (183.7046914696, 25))
        make_face()
        with BuildLine():
            ThreePointArc((197.7046914696, 25), (195.3732535852, 23.8879611731), (194.7702486674, 21.3762649275))
            Line((194.7702486674, 21.3762649275), (194, 25))
            Line((194, 25), (197.7046914696, 25))
        make_face()
        with BuildLine():
            ThreePointArc((211.7046914696, 25), (209.3732535852, 23.8879611731), (208.7702486674, 21.3762649275))
            Line((208.7702486674, 21.3762649275), (208, 25))
            Line((208, 25), (211.7046914696, 25))
        make_face()
    extrude(amount=F2_T3_DEPTH, mode=Mode.SUBTRACT)

    # F2_s6 → F2_t5 (cut)
    with BuildSketch(Plane.XZ.offset(-7.5)):
        with BuildLine():
            ThreePointArc((20, 22), (19.1213203436, 24.1213203436), (17, 25))
            Line((17, 25), (20, 25))
            Line((20, 25), (20, 22))
        make_face()
        with BuildLine():
            ThreePointArc((34, 22), (33.1213203436, 24.1213203436), (31, 25))
            Line((31, 25), (34, 25))
            Line((34, 25), (34, 22))
        make_face()
        with BuildLine():
            ThreePointArc((48, 22), (47.1213203436, 24.1213203436), (45, 25))
            Line((45, 25), (48, 25))
            Line((48, 25), (48, 22))
        make_face()
        with BuildLine():
            ThreePointArc((62, 22), (61.1213203436, 24.1213203436), (59, 25))
            Line((59, 25), (62, 25))
            Line((62, 25), (62, 22))
        make_face()
        with BuildLine():
            ThreePointArc((76, 22), (75.1213203436, 24.1213203436), (73, 25))
            Line((73, 25), (76, 25))
            Line((76, 25), (76, 22))
        make_face()
        with BuildLine():
            ThreePointArc((90, 22), (89.1213203436, 24.1213203436), (87, 25))
            Line((87, 25), (90, 25))
            Line((90, 25), (90, 22))
        make_face()
        with BuildLine():
            ThreePointArc((104, 22), (103.1213203436, 24.1213203436), (101, 25))
            Line((101, 25), (104, 25))
            Line((104, 25), (104, 22))
        make_face()
        with BuildLine():
            ThreePointArc((118, 22), (117.1213203436, 24.1213203436), (115, 25))
            Line((115, 25), (118, 25))
            Line((118, 25), (118, 22))
        make_face()
        with BuildLine():
            ThreePointArc((132, 22), (131.1213203436, 24.1213203436), (129, 25))
            Line((129, 25), (132, 25))
            Line((132, 25), (132, 22))
        make_face()
        with BuildLine():
            ThreePointArc((146, 22), (145.1213203436, 24.1213203436), (143, 25))
            Line((143, 25), (146, 25))
            Line((146, 25), (146, 22))
        make_face()
        with BuildLine():
            ThreePointArc((160, 22), (159.1213203436, 24.1213203436), (157, 25))
            Line((157, 25), (160, 25))
            Line((160, 25), (160, 22))
        make_face()
        with BuildLine():
            ThreePointArc((174, 22), (173.1213203436, 24.1213203436), (171, 25))
            Line((171, 25), (174, 25))
            Line((174, 25), (174, 22))
        make_face()
        with BuildLine():
            ThreePointArc((188, 22), (187.1213203436, 24.1213203436), (185, 25))
            Line((185, 25), (188, 25))
            Line((188, 25), (188, 22))
        make_face()
        with BuildLine():
            ThreePointArc((202, 22), (201.1213203436, 24.1213203436), (199, 25))
            Line((199, 25), (202, 25))
            Line((202, 25), (202, 22))
        make_face()
        with BuildLine():
            ThreePointArc((600, 22), (599.1213203436, 24.1213203436), (597, 25))
            Line((597, 25), (600, 25))
            Line((600, 25), (600, 22))
        make_face()
        with BuildLine():
            ThreePointArc((597, 0), (599.1213203436, 0.8786796564), (600, 3))
            Line((600, 3), (600, 0))
            Line((600, 0), (597, 0))
        make_face()
    extrude(amount=F2_T5_DEPTH, mode=Mode.SUBTRACT)

    # F2_s8 → F2_t7 (cut)
    with BuildSketch(Plane.XZ.offset(-6.3484800354)):
        with BuildLine():
            ThreePointArc((597.9, 19.1775744099), (599.4186773245, 20.2645680792), (600, 22.0393920142))
            Line((600, 22.0393920142), (600, 19.5))
            ThreePointArc((600, 19.5), (598.937696105, 19.4189240807), (597.9, 19.1775744099))
        make_face()
        with BuildLine():
            ThreePointArc((600, 2.9606079858), (599.4186773245, 4.7354319208), (597.9, 5.8224255901))
            ThreePointArc((597.9, 5.8224255901), (598.937696105, 5.5810759193), (600, 5.5))
            Line((600, 5.5), (600, 2.9606079858))
        make_face()
    extrude(amount=F2_T7_DEPTH, mode=Mode.SUBTRACT)


solid = f1.part
